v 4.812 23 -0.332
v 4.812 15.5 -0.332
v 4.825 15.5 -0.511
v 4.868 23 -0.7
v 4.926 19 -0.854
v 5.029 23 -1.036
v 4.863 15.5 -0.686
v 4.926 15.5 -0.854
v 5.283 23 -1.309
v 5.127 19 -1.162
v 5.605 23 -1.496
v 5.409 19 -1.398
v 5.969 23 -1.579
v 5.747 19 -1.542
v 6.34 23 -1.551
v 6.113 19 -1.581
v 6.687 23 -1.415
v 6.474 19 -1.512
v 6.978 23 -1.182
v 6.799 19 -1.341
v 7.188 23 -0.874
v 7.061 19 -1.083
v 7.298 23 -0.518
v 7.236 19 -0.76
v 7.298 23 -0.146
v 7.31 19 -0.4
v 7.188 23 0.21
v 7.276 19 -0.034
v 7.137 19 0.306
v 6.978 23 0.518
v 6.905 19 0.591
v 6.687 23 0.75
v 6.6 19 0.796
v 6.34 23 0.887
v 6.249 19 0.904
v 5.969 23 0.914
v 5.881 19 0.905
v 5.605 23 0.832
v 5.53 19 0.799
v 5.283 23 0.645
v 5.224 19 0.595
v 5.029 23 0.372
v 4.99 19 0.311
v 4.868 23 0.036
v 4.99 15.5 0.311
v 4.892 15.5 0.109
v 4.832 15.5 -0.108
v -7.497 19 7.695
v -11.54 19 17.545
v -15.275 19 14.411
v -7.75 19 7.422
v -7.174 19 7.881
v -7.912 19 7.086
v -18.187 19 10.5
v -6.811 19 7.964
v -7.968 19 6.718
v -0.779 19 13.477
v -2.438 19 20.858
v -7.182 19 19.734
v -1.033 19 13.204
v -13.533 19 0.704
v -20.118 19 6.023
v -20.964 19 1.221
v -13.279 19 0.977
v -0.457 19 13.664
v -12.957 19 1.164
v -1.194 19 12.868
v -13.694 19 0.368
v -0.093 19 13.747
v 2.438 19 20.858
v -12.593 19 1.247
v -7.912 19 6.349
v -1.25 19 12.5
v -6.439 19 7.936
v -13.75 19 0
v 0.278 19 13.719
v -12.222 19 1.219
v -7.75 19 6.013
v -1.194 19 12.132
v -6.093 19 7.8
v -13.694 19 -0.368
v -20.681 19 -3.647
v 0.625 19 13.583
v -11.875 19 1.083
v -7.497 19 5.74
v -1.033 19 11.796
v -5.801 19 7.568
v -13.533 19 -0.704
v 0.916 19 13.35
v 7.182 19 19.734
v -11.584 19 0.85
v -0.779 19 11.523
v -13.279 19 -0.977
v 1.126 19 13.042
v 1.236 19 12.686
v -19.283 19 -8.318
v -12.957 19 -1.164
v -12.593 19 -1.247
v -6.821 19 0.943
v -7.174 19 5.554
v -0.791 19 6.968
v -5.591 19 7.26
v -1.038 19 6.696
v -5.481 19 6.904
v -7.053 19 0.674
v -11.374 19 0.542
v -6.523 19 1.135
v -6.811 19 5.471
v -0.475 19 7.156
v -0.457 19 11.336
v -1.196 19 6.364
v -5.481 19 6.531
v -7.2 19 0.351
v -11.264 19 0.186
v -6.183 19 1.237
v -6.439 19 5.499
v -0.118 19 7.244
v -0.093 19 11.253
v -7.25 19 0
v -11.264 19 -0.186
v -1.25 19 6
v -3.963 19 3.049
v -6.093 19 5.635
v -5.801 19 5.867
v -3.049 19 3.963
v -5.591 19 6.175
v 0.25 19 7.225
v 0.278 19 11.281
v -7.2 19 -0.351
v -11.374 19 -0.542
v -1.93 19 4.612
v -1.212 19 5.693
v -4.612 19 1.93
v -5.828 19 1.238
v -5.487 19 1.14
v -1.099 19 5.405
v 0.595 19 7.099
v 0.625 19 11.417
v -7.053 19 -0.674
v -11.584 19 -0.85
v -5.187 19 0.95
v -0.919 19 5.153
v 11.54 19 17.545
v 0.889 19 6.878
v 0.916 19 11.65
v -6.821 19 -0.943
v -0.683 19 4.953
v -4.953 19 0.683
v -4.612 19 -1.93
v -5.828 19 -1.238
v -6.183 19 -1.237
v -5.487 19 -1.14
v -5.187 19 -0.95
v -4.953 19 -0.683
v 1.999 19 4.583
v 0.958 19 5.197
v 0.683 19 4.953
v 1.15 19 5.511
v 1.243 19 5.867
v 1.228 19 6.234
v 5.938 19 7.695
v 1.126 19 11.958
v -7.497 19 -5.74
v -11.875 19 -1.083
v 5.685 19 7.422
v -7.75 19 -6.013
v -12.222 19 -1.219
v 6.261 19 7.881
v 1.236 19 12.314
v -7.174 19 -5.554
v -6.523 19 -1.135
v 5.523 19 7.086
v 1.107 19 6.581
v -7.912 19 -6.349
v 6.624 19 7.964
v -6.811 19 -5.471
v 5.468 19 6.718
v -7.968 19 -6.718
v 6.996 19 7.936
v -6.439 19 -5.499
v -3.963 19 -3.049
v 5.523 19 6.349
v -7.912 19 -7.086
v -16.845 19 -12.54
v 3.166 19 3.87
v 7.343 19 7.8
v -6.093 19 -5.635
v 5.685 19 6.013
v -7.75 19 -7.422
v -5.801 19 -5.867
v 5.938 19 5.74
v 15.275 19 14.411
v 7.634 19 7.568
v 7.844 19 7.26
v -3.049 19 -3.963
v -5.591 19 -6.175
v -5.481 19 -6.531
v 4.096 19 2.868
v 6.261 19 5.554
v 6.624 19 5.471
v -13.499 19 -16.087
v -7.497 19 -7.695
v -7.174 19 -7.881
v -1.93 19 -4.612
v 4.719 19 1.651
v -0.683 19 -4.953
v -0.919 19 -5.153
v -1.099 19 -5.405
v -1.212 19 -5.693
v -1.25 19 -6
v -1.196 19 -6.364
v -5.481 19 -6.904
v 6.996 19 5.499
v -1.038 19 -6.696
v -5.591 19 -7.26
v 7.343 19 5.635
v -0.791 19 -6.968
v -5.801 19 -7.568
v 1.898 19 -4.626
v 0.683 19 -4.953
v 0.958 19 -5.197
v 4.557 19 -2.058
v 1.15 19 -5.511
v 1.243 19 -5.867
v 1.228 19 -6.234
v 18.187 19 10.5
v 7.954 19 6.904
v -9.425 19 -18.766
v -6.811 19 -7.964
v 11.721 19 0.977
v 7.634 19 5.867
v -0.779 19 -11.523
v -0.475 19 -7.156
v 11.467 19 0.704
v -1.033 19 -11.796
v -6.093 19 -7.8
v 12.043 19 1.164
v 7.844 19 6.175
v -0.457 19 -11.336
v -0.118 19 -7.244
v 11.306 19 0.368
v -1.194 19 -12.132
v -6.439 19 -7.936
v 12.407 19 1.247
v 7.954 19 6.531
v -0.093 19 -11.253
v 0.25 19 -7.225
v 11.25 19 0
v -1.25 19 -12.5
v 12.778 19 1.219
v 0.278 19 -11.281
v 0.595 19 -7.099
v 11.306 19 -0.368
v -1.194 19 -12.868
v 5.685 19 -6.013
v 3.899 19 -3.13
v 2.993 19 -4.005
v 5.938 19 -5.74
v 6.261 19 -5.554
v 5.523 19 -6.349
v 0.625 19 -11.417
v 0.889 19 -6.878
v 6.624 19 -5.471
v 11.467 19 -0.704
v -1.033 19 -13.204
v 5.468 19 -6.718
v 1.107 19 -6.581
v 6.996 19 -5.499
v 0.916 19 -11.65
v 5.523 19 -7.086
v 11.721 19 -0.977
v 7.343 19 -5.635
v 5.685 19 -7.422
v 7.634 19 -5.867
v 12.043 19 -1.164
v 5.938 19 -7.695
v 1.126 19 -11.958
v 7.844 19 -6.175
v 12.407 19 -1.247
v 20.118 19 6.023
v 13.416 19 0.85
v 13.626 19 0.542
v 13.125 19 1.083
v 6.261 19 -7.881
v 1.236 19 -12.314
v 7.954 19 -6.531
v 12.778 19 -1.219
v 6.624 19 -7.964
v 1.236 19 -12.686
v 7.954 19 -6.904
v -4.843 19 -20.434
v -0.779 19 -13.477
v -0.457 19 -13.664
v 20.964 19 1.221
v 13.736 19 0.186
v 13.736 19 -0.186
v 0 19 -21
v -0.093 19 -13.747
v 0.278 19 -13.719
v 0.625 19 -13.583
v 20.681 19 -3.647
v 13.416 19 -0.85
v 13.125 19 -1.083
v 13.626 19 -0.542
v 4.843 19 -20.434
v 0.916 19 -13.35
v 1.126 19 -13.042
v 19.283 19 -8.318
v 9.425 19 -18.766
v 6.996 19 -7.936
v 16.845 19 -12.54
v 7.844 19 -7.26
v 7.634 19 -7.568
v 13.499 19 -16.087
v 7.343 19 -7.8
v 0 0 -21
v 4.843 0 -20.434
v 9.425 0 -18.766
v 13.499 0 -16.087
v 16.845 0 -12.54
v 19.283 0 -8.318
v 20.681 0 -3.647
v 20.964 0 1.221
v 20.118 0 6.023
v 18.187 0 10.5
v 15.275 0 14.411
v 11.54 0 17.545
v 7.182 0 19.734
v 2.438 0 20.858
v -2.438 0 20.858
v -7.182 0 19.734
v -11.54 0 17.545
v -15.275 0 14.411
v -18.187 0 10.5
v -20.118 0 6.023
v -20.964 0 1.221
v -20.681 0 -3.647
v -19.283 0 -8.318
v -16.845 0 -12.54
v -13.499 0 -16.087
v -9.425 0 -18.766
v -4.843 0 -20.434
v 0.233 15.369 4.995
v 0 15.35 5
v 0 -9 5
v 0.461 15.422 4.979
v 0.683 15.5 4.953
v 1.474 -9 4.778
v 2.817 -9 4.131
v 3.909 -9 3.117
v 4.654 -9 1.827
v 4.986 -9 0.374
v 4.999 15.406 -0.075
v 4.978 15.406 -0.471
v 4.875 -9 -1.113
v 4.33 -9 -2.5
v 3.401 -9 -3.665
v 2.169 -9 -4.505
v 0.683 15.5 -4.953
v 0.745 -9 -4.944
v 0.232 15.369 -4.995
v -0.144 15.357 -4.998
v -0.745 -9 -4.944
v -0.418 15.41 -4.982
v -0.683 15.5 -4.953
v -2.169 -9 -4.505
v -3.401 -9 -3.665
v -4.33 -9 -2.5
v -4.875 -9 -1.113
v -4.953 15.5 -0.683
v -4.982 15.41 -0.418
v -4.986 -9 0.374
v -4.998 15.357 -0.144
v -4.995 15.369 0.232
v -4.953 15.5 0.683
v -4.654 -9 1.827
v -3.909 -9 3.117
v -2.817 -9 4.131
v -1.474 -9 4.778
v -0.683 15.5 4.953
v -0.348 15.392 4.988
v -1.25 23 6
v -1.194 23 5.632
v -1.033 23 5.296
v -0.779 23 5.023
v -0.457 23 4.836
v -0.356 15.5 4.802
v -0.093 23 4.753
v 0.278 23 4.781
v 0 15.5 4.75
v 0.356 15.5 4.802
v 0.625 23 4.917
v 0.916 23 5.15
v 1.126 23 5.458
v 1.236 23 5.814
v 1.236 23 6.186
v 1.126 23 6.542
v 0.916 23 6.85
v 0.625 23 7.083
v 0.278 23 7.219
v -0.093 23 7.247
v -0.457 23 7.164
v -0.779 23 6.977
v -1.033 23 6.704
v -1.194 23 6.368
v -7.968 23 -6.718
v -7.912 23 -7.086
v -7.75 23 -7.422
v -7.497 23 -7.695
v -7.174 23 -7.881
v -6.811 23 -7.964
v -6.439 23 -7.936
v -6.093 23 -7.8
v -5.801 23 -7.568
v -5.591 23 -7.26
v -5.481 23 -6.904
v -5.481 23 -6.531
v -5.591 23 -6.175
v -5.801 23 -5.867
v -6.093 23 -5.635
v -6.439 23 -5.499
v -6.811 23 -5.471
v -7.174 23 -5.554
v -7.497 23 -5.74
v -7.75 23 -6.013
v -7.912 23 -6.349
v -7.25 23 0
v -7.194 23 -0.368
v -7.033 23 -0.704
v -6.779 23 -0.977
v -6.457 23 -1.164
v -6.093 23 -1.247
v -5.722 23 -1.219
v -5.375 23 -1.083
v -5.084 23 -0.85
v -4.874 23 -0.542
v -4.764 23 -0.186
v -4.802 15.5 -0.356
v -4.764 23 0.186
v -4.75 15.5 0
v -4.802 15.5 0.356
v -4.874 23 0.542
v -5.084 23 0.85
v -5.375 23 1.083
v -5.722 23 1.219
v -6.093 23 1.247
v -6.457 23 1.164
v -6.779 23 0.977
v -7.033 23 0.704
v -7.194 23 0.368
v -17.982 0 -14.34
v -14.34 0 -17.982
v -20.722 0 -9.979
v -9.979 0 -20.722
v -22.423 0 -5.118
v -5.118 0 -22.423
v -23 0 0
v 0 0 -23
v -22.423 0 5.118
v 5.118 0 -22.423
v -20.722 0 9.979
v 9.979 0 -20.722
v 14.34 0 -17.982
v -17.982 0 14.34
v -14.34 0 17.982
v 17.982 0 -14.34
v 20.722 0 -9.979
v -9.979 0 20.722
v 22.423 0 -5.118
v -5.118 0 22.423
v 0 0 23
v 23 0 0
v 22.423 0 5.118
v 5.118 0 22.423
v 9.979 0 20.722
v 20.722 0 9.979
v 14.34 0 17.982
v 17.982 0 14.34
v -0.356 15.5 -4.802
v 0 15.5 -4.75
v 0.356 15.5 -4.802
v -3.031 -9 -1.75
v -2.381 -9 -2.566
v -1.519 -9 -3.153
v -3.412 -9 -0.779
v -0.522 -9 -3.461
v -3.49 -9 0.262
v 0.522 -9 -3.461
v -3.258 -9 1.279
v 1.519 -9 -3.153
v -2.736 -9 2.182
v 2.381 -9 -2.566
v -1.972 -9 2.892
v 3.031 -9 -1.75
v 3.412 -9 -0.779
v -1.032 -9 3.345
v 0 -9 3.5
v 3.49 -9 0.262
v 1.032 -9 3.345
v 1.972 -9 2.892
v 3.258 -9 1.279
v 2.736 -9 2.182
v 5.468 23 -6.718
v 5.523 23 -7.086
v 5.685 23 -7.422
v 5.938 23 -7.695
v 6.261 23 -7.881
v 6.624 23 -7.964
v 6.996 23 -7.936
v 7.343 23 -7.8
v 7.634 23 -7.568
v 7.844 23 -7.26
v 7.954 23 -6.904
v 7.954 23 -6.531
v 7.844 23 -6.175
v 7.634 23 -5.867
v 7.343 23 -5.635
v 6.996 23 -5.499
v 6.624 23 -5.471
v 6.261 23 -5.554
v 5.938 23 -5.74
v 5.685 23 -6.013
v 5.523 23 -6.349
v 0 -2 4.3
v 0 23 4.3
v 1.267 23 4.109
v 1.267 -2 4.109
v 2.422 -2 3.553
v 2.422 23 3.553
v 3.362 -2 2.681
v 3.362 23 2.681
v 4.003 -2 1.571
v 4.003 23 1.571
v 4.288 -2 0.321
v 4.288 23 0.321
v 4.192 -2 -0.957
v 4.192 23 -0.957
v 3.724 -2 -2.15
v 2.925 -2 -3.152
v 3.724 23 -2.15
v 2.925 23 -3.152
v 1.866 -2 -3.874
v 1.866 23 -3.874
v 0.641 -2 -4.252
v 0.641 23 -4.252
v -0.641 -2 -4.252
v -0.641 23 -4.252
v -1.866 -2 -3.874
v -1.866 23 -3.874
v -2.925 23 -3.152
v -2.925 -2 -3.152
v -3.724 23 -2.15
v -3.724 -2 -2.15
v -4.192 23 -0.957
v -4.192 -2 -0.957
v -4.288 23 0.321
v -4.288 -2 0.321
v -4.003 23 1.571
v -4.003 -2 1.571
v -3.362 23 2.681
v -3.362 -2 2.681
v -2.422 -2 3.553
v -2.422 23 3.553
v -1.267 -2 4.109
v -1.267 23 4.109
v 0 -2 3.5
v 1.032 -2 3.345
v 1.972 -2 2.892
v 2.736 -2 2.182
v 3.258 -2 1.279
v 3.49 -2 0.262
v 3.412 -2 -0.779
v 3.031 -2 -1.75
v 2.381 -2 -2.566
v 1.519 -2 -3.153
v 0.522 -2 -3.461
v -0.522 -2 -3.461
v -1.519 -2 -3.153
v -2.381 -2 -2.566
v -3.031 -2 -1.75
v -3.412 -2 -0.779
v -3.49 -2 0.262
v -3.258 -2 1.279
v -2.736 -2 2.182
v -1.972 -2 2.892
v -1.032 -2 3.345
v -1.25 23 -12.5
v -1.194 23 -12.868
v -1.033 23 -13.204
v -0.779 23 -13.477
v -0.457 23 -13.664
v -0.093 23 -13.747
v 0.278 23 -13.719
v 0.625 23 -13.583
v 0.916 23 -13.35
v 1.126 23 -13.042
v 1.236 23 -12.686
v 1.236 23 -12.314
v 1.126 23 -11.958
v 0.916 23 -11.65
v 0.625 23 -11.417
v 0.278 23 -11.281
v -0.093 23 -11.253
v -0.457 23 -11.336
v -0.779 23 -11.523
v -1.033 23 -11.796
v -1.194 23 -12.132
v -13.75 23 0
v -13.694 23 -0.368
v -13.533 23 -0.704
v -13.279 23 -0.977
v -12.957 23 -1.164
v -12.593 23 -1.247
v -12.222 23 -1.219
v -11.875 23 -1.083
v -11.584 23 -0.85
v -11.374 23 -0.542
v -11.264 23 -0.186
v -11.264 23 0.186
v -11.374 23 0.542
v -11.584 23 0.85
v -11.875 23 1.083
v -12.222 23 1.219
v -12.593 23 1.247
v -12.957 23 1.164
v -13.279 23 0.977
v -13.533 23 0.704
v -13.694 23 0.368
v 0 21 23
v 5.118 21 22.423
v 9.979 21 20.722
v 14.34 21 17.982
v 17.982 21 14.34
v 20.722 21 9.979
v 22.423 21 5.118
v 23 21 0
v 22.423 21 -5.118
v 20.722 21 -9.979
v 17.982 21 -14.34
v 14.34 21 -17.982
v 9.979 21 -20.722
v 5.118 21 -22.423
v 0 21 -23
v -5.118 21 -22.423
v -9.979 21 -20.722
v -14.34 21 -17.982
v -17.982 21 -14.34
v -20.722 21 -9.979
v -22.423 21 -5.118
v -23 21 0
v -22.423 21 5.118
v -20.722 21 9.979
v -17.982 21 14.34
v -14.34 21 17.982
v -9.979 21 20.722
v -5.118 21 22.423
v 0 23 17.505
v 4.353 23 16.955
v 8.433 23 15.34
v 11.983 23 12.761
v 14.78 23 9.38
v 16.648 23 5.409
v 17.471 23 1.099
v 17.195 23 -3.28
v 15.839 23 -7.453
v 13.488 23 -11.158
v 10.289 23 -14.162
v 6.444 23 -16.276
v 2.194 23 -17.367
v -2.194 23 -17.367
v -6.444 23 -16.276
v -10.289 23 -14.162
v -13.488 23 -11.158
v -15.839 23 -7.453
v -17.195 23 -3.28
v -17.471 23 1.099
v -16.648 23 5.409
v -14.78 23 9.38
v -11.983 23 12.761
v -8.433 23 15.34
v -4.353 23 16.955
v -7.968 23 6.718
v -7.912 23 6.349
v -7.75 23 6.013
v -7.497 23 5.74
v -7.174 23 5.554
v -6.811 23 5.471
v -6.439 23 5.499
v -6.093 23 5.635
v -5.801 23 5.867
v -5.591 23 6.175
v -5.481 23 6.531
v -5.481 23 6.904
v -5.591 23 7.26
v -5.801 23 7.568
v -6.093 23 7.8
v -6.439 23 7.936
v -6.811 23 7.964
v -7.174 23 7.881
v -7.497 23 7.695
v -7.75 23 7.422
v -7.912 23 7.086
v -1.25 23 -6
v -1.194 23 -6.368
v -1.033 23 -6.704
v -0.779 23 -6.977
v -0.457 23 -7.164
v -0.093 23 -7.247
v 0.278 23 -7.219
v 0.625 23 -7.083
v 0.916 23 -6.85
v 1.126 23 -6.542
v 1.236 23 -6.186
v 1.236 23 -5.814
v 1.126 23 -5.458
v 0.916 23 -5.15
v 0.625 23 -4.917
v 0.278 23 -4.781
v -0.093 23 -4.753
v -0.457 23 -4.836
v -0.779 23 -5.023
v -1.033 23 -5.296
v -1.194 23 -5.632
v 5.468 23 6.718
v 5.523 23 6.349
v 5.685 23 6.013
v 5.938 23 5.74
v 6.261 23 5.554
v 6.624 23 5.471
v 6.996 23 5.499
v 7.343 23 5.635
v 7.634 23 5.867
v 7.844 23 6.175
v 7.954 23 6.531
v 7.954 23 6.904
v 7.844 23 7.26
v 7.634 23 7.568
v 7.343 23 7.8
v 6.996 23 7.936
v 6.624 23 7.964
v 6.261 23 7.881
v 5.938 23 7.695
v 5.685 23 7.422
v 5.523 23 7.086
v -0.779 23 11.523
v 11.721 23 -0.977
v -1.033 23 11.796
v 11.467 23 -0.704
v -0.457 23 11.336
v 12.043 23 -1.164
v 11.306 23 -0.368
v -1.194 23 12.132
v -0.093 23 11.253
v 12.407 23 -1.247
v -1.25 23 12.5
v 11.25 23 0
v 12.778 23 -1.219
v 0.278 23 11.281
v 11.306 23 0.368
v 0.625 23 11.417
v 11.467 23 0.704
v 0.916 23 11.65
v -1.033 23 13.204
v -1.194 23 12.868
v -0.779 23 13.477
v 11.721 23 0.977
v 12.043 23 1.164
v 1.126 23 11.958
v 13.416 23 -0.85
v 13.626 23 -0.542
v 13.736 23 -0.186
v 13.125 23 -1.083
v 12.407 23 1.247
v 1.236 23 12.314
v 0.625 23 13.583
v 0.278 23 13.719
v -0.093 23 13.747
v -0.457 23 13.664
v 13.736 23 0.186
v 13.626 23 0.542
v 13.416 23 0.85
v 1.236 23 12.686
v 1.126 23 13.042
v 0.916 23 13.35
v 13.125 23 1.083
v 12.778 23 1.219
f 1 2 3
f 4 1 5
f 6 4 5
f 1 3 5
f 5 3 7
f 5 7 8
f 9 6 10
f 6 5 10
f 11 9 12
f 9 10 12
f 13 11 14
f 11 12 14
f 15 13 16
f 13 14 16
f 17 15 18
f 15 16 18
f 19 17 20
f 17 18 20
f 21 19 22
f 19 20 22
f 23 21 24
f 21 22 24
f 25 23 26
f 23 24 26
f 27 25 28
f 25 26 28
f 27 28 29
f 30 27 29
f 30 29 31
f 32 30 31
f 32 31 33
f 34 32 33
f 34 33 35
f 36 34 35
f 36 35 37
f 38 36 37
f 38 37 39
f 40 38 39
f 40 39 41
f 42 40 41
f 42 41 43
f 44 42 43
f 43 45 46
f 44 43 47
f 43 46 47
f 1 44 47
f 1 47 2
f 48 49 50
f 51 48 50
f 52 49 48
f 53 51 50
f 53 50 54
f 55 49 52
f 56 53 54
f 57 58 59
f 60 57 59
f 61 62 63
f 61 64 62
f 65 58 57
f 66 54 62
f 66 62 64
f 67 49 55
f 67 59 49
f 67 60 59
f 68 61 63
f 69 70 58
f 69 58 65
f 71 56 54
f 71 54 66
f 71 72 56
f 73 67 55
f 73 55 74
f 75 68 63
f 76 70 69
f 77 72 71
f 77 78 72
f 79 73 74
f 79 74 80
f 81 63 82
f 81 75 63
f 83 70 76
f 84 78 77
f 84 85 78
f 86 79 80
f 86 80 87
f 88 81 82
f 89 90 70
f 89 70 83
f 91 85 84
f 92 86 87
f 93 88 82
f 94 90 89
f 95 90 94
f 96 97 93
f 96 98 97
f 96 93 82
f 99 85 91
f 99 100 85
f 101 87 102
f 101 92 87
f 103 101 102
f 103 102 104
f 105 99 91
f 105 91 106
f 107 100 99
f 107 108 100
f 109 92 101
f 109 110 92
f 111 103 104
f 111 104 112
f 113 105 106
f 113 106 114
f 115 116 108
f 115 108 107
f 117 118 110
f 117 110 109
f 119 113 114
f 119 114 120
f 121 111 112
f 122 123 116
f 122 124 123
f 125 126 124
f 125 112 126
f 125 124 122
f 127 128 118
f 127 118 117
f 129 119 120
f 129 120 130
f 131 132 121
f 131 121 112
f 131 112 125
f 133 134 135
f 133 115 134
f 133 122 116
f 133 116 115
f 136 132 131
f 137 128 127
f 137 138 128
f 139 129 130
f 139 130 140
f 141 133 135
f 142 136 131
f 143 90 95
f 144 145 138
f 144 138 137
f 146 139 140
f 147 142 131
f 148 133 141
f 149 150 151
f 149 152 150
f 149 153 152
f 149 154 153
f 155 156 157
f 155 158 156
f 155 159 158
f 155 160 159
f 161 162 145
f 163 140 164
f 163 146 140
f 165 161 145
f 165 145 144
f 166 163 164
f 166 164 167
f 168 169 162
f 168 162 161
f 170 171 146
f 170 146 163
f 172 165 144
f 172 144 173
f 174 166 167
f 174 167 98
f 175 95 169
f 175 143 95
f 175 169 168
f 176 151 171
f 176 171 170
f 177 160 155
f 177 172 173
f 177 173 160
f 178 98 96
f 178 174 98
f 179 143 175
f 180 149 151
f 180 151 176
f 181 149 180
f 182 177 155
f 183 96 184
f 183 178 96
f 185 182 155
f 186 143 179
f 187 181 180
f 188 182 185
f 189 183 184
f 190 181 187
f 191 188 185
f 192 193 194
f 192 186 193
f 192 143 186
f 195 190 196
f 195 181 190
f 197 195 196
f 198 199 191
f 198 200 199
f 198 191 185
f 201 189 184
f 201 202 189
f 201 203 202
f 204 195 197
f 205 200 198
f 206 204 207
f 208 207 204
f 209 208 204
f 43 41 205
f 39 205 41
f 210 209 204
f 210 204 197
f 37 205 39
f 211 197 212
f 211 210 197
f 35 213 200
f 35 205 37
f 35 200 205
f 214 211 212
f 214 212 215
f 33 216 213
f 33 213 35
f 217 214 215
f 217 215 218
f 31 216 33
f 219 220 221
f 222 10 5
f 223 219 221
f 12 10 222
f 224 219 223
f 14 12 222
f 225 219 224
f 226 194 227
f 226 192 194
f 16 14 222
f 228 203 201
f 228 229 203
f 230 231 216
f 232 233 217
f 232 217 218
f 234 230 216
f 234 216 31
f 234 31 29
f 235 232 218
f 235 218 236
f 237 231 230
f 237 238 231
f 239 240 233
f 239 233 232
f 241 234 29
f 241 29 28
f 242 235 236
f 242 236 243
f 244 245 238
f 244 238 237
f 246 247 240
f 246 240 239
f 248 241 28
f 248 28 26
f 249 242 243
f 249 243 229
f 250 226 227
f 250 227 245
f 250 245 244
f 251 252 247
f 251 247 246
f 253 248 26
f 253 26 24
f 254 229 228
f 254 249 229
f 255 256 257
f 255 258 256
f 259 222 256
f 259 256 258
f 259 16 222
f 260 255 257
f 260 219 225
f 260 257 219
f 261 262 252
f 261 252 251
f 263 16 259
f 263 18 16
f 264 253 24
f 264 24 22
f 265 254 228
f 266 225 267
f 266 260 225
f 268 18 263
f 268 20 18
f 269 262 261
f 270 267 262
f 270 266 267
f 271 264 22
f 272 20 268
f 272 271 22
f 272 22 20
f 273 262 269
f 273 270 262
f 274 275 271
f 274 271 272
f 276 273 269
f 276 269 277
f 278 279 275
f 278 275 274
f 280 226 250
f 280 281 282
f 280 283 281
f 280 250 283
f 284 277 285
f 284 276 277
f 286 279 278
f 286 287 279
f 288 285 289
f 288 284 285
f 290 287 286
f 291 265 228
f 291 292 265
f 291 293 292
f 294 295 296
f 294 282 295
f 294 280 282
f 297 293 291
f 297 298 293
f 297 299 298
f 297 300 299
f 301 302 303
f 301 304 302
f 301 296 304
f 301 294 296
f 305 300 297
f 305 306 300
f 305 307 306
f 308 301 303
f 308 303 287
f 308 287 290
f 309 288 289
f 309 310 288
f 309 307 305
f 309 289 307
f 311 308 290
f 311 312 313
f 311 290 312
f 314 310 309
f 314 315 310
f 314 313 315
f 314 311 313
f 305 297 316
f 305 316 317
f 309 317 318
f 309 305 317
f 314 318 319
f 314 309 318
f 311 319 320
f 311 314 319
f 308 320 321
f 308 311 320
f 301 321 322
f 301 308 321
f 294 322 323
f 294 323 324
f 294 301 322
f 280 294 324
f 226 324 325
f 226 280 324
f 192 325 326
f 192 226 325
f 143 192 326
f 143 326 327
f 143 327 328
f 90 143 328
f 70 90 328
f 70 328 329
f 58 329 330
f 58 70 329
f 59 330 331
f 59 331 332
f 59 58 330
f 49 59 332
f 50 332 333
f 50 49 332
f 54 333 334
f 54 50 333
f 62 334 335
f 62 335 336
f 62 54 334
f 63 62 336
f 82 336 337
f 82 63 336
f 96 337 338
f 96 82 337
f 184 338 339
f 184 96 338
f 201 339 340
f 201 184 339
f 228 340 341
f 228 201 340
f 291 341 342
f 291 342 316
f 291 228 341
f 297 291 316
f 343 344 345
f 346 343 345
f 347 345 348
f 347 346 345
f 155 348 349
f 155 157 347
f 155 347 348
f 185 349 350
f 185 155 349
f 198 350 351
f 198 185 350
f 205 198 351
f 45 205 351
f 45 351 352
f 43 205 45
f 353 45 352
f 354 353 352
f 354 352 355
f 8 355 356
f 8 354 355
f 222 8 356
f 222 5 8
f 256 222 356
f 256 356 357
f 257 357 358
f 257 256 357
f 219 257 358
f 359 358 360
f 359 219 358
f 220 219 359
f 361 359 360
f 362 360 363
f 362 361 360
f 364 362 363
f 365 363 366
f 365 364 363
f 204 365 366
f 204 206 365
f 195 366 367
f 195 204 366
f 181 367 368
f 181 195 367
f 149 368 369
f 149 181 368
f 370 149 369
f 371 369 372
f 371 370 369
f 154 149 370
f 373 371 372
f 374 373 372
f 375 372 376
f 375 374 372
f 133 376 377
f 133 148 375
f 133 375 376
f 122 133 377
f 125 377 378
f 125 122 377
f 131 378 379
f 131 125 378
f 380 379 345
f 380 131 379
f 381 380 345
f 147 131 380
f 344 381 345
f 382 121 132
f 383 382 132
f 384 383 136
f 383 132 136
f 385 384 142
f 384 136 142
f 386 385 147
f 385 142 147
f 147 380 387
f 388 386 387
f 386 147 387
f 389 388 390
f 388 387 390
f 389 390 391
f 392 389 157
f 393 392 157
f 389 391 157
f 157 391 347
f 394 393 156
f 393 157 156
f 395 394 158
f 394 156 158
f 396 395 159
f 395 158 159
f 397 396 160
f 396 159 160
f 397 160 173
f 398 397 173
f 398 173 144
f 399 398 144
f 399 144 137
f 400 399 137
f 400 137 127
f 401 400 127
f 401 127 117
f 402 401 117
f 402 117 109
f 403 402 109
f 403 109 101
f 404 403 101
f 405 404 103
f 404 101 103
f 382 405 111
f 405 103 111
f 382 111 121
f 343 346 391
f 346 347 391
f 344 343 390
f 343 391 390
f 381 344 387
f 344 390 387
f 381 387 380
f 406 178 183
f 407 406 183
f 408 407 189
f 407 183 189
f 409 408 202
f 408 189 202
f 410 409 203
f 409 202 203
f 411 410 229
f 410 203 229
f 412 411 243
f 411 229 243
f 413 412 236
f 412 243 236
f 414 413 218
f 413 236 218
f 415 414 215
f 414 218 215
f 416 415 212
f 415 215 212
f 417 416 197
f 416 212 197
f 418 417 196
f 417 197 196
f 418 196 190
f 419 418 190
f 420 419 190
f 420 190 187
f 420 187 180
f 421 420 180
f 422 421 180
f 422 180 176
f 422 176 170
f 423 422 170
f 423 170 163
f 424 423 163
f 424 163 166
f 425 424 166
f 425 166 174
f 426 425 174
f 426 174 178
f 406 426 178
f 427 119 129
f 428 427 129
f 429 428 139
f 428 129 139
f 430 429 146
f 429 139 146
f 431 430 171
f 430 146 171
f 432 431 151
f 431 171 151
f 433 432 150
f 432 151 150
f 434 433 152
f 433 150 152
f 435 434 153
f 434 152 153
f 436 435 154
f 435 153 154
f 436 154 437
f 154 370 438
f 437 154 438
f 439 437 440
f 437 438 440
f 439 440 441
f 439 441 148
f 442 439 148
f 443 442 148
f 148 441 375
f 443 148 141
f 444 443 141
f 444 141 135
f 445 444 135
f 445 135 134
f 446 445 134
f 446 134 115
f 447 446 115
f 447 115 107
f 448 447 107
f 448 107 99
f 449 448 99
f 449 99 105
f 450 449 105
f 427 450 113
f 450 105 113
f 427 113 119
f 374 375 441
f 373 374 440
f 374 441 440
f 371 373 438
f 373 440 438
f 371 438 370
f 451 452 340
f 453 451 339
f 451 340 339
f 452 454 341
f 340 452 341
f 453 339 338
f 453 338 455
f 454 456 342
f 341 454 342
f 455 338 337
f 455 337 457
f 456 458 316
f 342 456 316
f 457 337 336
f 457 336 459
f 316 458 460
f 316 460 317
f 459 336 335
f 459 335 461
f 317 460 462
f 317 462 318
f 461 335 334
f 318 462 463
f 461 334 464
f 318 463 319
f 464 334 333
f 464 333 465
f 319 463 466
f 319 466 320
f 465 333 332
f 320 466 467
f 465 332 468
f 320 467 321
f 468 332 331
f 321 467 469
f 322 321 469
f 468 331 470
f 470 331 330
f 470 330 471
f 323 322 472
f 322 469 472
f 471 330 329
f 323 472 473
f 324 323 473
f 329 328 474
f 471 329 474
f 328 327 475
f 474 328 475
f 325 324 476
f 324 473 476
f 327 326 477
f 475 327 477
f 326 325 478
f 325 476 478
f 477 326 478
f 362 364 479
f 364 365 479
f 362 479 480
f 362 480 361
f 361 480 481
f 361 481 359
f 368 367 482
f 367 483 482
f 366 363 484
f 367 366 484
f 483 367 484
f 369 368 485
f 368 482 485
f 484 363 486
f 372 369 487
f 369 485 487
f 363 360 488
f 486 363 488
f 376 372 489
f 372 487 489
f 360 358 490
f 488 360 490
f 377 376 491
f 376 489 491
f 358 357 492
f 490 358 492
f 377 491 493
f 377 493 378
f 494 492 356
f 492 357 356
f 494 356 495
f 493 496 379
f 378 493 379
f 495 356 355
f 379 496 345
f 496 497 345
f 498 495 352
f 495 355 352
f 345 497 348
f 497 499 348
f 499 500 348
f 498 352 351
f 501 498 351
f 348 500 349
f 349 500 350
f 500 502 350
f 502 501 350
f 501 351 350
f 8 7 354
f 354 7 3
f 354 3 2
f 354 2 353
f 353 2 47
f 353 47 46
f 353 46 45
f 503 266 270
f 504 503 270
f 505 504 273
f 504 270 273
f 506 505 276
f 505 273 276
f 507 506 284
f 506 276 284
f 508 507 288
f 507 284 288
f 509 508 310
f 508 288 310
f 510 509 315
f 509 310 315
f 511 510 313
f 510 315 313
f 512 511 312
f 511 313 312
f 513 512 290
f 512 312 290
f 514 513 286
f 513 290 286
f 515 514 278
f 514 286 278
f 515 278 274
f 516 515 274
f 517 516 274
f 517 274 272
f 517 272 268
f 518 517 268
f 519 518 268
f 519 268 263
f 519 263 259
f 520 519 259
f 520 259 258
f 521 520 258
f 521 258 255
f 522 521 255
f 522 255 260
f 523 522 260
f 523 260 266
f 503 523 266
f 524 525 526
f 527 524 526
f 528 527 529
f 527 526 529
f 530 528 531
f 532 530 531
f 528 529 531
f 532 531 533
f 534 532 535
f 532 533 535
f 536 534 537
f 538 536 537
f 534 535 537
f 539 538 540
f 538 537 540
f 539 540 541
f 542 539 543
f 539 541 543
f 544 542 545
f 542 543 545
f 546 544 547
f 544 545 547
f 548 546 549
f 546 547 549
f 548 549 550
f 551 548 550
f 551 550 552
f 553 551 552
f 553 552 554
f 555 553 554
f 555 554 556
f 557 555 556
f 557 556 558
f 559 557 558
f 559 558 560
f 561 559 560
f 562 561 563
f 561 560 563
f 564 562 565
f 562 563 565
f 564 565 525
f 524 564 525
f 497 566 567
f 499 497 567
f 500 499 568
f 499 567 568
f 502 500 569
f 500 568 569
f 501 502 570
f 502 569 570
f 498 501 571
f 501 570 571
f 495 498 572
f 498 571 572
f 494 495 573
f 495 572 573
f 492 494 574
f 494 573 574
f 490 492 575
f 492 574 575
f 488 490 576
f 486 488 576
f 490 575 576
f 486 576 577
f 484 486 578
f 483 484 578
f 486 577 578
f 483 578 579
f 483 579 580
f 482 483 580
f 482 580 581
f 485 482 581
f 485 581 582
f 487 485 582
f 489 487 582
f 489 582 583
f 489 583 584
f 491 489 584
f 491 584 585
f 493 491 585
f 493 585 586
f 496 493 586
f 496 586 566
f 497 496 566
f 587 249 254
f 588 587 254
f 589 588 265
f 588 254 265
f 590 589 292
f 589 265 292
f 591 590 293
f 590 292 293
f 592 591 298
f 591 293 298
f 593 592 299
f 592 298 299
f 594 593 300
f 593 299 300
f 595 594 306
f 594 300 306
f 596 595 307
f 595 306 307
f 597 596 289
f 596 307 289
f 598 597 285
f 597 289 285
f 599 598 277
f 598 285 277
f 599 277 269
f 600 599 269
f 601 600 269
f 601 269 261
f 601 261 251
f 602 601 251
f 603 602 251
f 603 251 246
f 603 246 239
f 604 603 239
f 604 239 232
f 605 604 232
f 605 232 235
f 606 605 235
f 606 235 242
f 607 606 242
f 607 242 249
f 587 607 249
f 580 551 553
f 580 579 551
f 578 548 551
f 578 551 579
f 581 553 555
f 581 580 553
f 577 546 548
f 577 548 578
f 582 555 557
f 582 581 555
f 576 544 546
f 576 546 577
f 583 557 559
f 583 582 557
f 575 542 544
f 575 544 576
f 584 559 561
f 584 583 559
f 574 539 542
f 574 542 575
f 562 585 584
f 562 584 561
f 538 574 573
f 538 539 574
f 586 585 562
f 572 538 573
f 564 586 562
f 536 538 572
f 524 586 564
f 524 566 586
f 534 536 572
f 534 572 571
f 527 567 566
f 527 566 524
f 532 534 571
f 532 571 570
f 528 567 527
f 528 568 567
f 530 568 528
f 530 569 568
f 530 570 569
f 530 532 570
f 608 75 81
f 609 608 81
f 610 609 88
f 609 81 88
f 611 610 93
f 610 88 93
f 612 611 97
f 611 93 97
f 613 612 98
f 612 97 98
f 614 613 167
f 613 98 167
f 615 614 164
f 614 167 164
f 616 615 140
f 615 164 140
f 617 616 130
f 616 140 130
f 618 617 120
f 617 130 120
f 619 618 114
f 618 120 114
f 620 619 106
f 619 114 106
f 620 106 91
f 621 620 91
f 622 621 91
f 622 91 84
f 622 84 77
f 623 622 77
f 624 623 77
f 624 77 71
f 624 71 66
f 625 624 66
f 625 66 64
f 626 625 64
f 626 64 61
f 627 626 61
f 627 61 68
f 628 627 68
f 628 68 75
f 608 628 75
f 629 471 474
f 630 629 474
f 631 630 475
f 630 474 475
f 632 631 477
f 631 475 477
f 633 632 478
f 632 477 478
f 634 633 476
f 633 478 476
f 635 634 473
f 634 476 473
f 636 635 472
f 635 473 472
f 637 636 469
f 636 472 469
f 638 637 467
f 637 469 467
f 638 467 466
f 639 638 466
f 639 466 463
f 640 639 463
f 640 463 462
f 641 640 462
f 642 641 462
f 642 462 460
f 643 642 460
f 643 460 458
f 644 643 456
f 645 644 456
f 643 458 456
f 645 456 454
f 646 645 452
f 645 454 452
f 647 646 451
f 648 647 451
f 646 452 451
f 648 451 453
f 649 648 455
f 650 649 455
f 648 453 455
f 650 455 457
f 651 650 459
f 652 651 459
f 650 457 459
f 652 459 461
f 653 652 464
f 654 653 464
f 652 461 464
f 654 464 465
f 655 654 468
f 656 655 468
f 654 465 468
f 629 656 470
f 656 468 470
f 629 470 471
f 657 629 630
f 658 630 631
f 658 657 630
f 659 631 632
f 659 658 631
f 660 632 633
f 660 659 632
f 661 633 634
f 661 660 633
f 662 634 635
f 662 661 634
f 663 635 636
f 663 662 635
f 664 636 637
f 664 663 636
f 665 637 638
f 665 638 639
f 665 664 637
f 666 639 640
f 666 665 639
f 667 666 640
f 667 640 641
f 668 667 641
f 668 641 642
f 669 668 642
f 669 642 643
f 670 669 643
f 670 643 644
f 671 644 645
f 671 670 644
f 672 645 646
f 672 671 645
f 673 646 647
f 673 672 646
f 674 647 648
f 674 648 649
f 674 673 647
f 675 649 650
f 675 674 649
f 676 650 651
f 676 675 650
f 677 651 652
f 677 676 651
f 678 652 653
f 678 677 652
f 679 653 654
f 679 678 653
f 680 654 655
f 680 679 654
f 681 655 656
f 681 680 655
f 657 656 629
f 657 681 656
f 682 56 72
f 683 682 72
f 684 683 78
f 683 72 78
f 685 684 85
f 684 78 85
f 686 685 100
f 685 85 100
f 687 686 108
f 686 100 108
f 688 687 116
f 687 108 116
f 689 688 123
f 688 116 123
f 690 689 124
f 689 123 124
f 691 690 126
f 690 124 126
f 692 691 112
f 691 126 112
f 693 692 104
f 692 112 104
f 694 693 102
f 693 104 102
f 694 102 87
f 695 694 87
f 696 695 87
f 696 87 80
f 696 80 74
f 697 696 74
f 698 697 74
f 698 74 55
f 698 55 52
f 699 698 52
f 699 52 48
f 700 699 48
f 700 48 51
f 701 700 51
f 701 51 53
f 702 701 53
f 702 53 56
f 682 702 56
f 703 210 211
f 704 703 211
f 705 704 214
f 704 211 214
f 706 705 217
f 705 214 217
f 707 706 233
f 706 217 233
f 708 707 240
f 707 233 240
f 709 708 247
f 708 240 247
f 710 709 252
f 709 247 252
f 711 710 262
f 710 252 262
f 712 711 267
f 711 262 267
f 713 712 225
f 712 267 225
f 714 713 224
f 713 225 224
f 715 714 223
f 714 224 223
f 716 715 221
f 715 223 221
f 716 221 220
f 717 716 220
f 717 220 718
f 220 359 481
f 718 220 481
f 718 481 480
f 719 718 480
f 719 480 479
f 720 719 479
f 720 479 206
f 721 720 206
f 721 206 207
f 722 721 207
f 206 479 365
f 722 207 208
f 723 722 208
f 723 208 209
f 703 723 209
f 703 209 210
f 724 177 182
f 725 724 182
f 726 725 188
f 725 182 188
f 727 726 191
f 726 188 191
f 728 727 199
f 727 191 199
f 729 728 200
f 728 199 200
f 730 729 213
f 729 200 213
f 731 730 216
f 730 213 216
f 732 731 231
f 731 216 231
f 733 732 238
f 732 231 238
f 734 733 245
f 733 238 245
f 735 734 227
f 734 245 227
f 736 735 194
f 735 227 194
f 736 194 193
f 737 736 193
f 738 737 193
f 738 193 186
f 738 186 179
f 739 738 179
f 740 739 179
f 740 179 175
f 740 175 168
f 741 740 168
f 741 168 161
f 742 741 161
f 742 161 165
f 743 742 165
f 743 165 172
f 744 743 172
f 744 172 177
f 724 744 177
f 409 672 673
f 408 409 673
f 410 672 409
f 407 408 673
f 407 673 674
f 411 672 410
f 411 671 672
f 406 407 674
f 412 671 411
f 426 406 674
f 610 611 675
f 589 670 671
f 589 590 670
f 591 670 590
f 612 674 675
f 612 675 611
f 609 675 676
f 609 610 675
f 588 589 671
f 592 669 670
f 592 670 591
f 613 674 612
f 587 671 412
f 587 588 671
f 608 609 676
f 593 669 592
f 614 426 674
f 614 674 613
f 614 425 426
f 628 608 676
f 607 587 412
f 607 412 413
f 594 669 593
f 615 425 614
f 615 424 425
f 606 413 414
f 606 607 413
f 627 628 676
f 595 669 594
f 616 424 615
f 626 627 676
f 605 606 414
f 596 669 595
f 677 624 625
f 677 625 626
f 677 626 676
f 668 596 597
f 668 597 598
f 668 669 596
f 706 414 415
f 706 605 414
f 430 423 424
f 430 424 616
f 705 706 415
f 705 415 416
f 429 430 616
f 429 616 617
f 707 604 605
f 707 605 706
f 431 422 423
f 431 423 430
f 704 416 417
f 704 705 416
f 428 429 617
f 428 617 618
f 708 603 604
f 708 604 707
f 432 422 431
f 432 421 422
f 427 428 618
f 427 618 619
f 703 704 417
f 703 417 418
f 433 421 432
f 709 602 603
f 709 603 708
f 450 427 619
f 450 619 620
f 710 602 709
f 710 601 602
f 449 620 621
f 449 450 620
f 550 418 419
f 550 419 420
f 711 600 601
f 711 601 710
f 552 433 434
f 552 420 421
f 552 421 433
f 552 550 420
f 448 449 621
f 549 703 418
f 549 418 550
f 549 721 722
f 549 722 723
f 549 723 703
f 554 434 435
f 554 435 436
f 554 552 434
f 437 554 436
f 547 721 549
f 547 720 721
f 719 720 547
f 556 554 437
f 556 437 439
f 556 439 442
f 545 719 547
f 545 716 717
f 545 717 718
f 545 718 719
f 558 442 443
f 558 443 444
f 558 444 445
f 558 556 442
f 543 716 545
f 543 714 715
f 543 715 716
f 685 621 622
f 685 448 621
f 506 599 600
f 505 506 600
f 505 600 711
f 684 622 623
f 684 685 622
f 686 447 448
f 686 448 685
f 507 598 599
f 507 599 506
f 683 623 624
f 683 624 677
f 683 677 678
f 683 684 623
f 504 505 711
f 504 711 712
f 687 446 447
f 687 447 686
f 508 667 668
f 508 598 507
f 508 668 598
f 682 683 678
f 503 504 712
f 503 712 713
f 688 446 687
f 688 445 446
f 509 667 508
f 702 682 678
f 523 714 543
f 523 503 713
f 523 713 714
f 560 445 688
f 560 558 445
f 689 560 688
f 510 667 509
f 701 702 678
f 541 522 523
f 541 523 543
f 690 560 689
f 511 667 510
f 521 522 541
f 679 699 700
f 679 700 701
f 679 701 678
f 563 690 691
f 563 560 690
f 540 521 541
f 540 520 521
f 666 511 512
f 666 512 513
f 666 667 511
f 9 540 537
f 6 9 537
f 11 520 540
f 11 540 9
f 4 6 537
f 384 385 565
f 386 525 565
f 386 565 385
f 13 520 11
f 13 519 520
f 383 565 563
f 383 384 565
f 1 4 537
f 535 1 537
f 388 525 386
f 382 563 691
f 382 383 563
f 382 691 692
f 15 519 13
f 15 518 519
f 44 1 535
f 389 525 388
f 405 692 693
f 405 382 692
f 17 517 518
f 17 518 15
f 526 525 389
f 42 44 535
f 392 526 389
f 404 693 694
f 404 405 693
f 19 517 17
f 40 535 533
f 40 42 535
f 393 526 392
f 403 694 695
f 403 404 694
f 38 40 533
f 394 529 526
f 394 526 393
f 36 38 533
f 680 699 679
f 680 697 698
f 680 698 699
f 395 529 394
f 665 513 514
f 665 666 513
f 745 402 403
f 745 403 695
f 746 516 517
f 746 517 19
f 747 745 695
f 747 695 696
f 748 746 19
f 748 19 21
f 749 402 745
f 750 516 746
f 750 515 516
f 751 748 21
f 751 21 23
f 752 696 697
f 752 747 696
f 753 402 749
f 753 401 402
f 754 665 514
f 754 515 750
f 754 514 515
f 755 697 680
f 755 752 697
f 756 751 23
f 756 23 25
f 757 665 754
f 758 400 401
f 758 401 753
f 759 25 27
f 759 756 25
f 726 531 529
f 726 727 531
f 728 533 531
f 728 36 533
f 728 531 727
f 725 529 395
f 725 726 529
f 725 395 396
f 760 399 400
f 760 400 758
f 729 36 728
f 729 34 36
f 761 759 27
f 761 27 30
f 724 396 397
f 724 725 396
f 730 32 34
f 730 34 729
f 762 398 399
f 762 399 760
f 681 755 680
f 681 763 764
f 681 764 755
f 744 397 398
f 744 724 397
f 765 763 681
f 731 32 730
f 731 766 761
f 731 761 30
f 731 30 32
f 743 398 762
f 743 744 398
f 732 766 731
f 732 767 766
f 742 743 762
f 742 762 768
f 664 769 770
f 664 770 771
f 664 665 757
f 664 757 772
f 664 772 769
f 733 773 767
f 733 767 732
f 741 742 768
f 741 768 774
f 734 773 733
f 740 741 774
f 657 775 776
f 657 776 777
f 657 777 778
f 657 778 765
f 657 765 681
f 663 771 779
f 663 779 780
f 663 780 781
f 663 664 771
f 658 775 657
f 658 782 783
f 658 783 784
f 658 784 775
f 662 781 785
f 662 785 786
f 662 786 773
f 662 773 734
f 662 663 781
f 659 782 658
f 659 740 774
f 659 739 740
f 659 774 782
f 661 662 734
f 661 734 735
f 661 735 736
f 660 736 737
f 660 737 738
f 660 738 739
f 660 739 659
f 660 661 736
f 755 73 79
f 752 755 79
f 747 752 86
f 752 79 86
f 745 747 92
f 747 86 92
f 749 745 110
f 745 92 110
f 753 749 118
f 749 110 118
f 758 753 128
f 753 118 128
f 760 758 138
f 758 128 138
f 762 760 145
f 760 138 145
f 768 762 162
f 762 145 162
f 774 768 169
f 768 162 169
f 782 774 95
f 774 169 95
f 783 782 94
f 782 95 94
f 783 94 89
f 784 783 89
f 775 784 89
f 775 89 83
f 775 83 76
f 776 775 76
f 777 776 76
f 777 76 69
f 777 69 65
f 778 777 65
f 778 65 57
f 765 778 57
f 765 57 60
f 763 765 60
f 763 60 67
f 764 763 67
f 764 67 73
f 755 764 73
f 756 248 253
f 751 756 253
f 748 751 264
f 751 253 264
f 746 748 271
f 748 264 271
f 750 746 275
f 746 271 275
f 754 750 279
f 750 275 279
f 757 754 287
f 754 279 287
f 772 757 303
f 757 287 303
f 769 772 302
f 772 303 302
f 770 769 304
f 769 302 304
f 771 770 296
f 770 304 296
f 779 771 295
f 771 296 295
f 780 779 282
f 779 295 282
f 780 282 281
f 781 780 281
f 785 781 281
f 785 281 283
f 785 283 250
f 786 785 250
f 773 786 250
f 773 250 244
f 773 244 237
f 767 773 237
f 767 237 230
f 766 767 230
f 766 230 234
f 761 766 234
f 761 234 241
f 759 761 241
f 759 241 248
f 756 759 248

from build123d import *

# Parameters (mm, degrees)
SKETCH_1_R          = 23
EXTRUDE_1_DEPTH     = 23
CHAMFER_1_SIZE      = 2
CHAMFER_1_SIZE2     = 5.494954839
SKETCH_2_R          = 3.5
CUT_EXTRUDE_1_DEPTH = 40.837168574
SKETCH_2_3_R        = 5
SKETCH_2_3_R_2      = 3.5
EXTRUDE_2_DEPTH     = 32
CUT_EXTRUDE_START   = -19
SKETCH_4_R          = 21
SKETCH_4_R_2        = 5
CUT_EXTRUDE_2_DEPTH = 19
M3X0_51_D           = 2.5
M3X0_52_D           = 2.5
M3X0_52_DEPTH       = 7.5
M3X0_52_TIP         = 0.751075774
M3X0_53_D           = 2.5
SKETCH_12_R         = 4.3
CUT_EXTRUDE_3_DEPTH = 25


with BuildPart() as part:
    # Эскиз1 → Бобышка-Вытянуть1 (new body)
    with BuildSketch(Plane(origin=(0, 0, 0), x_dir=(1, 0, 0), z_dir=(0, 1, 0))):
        Circle(SKETCH_1_R)
    extrude(amount=EXTRUDE_1_DEPTH)

    # Фаска1
    chamfer_1_edges = [part.edges().sort_by_distance(p)[0] for p in [
        (-23, 23, 0),
    ]]
    chamfer_1_side = [part.faces().sort_by_distance(p)[0] for p in [
        (-23, 11.5, 0),
    ]]
    chamfer(chamfer_1_edges, length=CHAMFER_1_SIZE, length2=CHAMFER_1_SIZE2, reference=chamfer_1_side[0])

    # Эскиз2 → Вырез-Вытянуть1 (cut, through all)
    with BuildSketch(Plane(origin=(0, 23, 0), x_dir=(1, 0, 0), z_dir=(0, 1, 0))):
        Circle(SKETCH_2_R)
    extrude(amount=-CUT_EXTRUDE_1_DEPTH, mode=Mode.SUBTRACT)

    # Эскиз2<3> → Бобышка-Вытянуть2 (add)
    with BuildSketch(Plane(origin=(0, 23, 0), x_dir=(1, 0, 0), z_dir=(0, 1, 0))):
        Circle(SKETCH_2_3_R)
        Circle(SKETCH_2_3_R_2, mode=Mode.SUBTRACT)
    extrude(amount=-EXTRUDE_2_DEPTH)

    # Эскиз4 → Вырез-Вытянуть2 (cut)
    with BuildSketch(Plane.XZ.offset(CUT_EXTRUDE_START)):
        Circle(SKETCH_4_R)
        Circle(SKETCH_4_R_2, mode=Mode.SUBTRACT)
    extrude(amount=CUT_EXTRUDE_2_DEPTH, mode=Mode.SUBTRACT)

    # Отверстие обработанное метчиком M3x0.51 (through all)
    with Locations(Plane(origin=(0, 23, 0), x_dir=(1, 0, 0), z_dir=(0, 1, 0))):
        with Locations((0, 12.5), (12.5, 0), (0, -12.5), (-12.5, 0)):
            Hole(M3X0_51_D / 2)

    # Отверстие обработанное метчиком M3x0.52
    with Locations(Plane(origin=(0, 23, 0), x_dir=(1, 0, 0), z_dir=(0, 1, 0))):
        with Locations((6.062159206, 0.332038968), (0, 6), (-6, 0), (0, -6)):
            Hole(M3X0_52_D / 2, depth=M3X0_52_DEPTH)
            with Locations((0, 0, -(M3X0_52_DEPTH + M3X0_52_TIP / 2))):  # 118° drill point
                Cone(0, M3X0_52_D / 2, M3X0_52_TIP, mode=Mode.SUBTRACT)

    # Отверстие обработанное метчиком M3x0.53 (through all)
    with Locations(Plane(origin=(0, 23, 0), x_dir=(1, 0, 0), z_dir=(0, 1, 0))):
        with Locations((-6.717514421, 6.717514421), (6.717514421, 6.717514421), (6.717514421, -6.717514421), (-6.717514421, -6.717514421)):
            Hole(M3X0_53_D / 2)

    # Эскиз12 → Вырез-Вытянуть3 (cut)
    with BuildSketch(Plane(origin=(0, 23, 0), x_dir=(1, 0, 0), z_dir=(0, 1, 0))):
        Circle(SKETCH_12_R)
    extrude(amount=-CUT_EXTRUDE_3_DEPTH, mode=Mode.SUBTRACT)


solid = part.part
